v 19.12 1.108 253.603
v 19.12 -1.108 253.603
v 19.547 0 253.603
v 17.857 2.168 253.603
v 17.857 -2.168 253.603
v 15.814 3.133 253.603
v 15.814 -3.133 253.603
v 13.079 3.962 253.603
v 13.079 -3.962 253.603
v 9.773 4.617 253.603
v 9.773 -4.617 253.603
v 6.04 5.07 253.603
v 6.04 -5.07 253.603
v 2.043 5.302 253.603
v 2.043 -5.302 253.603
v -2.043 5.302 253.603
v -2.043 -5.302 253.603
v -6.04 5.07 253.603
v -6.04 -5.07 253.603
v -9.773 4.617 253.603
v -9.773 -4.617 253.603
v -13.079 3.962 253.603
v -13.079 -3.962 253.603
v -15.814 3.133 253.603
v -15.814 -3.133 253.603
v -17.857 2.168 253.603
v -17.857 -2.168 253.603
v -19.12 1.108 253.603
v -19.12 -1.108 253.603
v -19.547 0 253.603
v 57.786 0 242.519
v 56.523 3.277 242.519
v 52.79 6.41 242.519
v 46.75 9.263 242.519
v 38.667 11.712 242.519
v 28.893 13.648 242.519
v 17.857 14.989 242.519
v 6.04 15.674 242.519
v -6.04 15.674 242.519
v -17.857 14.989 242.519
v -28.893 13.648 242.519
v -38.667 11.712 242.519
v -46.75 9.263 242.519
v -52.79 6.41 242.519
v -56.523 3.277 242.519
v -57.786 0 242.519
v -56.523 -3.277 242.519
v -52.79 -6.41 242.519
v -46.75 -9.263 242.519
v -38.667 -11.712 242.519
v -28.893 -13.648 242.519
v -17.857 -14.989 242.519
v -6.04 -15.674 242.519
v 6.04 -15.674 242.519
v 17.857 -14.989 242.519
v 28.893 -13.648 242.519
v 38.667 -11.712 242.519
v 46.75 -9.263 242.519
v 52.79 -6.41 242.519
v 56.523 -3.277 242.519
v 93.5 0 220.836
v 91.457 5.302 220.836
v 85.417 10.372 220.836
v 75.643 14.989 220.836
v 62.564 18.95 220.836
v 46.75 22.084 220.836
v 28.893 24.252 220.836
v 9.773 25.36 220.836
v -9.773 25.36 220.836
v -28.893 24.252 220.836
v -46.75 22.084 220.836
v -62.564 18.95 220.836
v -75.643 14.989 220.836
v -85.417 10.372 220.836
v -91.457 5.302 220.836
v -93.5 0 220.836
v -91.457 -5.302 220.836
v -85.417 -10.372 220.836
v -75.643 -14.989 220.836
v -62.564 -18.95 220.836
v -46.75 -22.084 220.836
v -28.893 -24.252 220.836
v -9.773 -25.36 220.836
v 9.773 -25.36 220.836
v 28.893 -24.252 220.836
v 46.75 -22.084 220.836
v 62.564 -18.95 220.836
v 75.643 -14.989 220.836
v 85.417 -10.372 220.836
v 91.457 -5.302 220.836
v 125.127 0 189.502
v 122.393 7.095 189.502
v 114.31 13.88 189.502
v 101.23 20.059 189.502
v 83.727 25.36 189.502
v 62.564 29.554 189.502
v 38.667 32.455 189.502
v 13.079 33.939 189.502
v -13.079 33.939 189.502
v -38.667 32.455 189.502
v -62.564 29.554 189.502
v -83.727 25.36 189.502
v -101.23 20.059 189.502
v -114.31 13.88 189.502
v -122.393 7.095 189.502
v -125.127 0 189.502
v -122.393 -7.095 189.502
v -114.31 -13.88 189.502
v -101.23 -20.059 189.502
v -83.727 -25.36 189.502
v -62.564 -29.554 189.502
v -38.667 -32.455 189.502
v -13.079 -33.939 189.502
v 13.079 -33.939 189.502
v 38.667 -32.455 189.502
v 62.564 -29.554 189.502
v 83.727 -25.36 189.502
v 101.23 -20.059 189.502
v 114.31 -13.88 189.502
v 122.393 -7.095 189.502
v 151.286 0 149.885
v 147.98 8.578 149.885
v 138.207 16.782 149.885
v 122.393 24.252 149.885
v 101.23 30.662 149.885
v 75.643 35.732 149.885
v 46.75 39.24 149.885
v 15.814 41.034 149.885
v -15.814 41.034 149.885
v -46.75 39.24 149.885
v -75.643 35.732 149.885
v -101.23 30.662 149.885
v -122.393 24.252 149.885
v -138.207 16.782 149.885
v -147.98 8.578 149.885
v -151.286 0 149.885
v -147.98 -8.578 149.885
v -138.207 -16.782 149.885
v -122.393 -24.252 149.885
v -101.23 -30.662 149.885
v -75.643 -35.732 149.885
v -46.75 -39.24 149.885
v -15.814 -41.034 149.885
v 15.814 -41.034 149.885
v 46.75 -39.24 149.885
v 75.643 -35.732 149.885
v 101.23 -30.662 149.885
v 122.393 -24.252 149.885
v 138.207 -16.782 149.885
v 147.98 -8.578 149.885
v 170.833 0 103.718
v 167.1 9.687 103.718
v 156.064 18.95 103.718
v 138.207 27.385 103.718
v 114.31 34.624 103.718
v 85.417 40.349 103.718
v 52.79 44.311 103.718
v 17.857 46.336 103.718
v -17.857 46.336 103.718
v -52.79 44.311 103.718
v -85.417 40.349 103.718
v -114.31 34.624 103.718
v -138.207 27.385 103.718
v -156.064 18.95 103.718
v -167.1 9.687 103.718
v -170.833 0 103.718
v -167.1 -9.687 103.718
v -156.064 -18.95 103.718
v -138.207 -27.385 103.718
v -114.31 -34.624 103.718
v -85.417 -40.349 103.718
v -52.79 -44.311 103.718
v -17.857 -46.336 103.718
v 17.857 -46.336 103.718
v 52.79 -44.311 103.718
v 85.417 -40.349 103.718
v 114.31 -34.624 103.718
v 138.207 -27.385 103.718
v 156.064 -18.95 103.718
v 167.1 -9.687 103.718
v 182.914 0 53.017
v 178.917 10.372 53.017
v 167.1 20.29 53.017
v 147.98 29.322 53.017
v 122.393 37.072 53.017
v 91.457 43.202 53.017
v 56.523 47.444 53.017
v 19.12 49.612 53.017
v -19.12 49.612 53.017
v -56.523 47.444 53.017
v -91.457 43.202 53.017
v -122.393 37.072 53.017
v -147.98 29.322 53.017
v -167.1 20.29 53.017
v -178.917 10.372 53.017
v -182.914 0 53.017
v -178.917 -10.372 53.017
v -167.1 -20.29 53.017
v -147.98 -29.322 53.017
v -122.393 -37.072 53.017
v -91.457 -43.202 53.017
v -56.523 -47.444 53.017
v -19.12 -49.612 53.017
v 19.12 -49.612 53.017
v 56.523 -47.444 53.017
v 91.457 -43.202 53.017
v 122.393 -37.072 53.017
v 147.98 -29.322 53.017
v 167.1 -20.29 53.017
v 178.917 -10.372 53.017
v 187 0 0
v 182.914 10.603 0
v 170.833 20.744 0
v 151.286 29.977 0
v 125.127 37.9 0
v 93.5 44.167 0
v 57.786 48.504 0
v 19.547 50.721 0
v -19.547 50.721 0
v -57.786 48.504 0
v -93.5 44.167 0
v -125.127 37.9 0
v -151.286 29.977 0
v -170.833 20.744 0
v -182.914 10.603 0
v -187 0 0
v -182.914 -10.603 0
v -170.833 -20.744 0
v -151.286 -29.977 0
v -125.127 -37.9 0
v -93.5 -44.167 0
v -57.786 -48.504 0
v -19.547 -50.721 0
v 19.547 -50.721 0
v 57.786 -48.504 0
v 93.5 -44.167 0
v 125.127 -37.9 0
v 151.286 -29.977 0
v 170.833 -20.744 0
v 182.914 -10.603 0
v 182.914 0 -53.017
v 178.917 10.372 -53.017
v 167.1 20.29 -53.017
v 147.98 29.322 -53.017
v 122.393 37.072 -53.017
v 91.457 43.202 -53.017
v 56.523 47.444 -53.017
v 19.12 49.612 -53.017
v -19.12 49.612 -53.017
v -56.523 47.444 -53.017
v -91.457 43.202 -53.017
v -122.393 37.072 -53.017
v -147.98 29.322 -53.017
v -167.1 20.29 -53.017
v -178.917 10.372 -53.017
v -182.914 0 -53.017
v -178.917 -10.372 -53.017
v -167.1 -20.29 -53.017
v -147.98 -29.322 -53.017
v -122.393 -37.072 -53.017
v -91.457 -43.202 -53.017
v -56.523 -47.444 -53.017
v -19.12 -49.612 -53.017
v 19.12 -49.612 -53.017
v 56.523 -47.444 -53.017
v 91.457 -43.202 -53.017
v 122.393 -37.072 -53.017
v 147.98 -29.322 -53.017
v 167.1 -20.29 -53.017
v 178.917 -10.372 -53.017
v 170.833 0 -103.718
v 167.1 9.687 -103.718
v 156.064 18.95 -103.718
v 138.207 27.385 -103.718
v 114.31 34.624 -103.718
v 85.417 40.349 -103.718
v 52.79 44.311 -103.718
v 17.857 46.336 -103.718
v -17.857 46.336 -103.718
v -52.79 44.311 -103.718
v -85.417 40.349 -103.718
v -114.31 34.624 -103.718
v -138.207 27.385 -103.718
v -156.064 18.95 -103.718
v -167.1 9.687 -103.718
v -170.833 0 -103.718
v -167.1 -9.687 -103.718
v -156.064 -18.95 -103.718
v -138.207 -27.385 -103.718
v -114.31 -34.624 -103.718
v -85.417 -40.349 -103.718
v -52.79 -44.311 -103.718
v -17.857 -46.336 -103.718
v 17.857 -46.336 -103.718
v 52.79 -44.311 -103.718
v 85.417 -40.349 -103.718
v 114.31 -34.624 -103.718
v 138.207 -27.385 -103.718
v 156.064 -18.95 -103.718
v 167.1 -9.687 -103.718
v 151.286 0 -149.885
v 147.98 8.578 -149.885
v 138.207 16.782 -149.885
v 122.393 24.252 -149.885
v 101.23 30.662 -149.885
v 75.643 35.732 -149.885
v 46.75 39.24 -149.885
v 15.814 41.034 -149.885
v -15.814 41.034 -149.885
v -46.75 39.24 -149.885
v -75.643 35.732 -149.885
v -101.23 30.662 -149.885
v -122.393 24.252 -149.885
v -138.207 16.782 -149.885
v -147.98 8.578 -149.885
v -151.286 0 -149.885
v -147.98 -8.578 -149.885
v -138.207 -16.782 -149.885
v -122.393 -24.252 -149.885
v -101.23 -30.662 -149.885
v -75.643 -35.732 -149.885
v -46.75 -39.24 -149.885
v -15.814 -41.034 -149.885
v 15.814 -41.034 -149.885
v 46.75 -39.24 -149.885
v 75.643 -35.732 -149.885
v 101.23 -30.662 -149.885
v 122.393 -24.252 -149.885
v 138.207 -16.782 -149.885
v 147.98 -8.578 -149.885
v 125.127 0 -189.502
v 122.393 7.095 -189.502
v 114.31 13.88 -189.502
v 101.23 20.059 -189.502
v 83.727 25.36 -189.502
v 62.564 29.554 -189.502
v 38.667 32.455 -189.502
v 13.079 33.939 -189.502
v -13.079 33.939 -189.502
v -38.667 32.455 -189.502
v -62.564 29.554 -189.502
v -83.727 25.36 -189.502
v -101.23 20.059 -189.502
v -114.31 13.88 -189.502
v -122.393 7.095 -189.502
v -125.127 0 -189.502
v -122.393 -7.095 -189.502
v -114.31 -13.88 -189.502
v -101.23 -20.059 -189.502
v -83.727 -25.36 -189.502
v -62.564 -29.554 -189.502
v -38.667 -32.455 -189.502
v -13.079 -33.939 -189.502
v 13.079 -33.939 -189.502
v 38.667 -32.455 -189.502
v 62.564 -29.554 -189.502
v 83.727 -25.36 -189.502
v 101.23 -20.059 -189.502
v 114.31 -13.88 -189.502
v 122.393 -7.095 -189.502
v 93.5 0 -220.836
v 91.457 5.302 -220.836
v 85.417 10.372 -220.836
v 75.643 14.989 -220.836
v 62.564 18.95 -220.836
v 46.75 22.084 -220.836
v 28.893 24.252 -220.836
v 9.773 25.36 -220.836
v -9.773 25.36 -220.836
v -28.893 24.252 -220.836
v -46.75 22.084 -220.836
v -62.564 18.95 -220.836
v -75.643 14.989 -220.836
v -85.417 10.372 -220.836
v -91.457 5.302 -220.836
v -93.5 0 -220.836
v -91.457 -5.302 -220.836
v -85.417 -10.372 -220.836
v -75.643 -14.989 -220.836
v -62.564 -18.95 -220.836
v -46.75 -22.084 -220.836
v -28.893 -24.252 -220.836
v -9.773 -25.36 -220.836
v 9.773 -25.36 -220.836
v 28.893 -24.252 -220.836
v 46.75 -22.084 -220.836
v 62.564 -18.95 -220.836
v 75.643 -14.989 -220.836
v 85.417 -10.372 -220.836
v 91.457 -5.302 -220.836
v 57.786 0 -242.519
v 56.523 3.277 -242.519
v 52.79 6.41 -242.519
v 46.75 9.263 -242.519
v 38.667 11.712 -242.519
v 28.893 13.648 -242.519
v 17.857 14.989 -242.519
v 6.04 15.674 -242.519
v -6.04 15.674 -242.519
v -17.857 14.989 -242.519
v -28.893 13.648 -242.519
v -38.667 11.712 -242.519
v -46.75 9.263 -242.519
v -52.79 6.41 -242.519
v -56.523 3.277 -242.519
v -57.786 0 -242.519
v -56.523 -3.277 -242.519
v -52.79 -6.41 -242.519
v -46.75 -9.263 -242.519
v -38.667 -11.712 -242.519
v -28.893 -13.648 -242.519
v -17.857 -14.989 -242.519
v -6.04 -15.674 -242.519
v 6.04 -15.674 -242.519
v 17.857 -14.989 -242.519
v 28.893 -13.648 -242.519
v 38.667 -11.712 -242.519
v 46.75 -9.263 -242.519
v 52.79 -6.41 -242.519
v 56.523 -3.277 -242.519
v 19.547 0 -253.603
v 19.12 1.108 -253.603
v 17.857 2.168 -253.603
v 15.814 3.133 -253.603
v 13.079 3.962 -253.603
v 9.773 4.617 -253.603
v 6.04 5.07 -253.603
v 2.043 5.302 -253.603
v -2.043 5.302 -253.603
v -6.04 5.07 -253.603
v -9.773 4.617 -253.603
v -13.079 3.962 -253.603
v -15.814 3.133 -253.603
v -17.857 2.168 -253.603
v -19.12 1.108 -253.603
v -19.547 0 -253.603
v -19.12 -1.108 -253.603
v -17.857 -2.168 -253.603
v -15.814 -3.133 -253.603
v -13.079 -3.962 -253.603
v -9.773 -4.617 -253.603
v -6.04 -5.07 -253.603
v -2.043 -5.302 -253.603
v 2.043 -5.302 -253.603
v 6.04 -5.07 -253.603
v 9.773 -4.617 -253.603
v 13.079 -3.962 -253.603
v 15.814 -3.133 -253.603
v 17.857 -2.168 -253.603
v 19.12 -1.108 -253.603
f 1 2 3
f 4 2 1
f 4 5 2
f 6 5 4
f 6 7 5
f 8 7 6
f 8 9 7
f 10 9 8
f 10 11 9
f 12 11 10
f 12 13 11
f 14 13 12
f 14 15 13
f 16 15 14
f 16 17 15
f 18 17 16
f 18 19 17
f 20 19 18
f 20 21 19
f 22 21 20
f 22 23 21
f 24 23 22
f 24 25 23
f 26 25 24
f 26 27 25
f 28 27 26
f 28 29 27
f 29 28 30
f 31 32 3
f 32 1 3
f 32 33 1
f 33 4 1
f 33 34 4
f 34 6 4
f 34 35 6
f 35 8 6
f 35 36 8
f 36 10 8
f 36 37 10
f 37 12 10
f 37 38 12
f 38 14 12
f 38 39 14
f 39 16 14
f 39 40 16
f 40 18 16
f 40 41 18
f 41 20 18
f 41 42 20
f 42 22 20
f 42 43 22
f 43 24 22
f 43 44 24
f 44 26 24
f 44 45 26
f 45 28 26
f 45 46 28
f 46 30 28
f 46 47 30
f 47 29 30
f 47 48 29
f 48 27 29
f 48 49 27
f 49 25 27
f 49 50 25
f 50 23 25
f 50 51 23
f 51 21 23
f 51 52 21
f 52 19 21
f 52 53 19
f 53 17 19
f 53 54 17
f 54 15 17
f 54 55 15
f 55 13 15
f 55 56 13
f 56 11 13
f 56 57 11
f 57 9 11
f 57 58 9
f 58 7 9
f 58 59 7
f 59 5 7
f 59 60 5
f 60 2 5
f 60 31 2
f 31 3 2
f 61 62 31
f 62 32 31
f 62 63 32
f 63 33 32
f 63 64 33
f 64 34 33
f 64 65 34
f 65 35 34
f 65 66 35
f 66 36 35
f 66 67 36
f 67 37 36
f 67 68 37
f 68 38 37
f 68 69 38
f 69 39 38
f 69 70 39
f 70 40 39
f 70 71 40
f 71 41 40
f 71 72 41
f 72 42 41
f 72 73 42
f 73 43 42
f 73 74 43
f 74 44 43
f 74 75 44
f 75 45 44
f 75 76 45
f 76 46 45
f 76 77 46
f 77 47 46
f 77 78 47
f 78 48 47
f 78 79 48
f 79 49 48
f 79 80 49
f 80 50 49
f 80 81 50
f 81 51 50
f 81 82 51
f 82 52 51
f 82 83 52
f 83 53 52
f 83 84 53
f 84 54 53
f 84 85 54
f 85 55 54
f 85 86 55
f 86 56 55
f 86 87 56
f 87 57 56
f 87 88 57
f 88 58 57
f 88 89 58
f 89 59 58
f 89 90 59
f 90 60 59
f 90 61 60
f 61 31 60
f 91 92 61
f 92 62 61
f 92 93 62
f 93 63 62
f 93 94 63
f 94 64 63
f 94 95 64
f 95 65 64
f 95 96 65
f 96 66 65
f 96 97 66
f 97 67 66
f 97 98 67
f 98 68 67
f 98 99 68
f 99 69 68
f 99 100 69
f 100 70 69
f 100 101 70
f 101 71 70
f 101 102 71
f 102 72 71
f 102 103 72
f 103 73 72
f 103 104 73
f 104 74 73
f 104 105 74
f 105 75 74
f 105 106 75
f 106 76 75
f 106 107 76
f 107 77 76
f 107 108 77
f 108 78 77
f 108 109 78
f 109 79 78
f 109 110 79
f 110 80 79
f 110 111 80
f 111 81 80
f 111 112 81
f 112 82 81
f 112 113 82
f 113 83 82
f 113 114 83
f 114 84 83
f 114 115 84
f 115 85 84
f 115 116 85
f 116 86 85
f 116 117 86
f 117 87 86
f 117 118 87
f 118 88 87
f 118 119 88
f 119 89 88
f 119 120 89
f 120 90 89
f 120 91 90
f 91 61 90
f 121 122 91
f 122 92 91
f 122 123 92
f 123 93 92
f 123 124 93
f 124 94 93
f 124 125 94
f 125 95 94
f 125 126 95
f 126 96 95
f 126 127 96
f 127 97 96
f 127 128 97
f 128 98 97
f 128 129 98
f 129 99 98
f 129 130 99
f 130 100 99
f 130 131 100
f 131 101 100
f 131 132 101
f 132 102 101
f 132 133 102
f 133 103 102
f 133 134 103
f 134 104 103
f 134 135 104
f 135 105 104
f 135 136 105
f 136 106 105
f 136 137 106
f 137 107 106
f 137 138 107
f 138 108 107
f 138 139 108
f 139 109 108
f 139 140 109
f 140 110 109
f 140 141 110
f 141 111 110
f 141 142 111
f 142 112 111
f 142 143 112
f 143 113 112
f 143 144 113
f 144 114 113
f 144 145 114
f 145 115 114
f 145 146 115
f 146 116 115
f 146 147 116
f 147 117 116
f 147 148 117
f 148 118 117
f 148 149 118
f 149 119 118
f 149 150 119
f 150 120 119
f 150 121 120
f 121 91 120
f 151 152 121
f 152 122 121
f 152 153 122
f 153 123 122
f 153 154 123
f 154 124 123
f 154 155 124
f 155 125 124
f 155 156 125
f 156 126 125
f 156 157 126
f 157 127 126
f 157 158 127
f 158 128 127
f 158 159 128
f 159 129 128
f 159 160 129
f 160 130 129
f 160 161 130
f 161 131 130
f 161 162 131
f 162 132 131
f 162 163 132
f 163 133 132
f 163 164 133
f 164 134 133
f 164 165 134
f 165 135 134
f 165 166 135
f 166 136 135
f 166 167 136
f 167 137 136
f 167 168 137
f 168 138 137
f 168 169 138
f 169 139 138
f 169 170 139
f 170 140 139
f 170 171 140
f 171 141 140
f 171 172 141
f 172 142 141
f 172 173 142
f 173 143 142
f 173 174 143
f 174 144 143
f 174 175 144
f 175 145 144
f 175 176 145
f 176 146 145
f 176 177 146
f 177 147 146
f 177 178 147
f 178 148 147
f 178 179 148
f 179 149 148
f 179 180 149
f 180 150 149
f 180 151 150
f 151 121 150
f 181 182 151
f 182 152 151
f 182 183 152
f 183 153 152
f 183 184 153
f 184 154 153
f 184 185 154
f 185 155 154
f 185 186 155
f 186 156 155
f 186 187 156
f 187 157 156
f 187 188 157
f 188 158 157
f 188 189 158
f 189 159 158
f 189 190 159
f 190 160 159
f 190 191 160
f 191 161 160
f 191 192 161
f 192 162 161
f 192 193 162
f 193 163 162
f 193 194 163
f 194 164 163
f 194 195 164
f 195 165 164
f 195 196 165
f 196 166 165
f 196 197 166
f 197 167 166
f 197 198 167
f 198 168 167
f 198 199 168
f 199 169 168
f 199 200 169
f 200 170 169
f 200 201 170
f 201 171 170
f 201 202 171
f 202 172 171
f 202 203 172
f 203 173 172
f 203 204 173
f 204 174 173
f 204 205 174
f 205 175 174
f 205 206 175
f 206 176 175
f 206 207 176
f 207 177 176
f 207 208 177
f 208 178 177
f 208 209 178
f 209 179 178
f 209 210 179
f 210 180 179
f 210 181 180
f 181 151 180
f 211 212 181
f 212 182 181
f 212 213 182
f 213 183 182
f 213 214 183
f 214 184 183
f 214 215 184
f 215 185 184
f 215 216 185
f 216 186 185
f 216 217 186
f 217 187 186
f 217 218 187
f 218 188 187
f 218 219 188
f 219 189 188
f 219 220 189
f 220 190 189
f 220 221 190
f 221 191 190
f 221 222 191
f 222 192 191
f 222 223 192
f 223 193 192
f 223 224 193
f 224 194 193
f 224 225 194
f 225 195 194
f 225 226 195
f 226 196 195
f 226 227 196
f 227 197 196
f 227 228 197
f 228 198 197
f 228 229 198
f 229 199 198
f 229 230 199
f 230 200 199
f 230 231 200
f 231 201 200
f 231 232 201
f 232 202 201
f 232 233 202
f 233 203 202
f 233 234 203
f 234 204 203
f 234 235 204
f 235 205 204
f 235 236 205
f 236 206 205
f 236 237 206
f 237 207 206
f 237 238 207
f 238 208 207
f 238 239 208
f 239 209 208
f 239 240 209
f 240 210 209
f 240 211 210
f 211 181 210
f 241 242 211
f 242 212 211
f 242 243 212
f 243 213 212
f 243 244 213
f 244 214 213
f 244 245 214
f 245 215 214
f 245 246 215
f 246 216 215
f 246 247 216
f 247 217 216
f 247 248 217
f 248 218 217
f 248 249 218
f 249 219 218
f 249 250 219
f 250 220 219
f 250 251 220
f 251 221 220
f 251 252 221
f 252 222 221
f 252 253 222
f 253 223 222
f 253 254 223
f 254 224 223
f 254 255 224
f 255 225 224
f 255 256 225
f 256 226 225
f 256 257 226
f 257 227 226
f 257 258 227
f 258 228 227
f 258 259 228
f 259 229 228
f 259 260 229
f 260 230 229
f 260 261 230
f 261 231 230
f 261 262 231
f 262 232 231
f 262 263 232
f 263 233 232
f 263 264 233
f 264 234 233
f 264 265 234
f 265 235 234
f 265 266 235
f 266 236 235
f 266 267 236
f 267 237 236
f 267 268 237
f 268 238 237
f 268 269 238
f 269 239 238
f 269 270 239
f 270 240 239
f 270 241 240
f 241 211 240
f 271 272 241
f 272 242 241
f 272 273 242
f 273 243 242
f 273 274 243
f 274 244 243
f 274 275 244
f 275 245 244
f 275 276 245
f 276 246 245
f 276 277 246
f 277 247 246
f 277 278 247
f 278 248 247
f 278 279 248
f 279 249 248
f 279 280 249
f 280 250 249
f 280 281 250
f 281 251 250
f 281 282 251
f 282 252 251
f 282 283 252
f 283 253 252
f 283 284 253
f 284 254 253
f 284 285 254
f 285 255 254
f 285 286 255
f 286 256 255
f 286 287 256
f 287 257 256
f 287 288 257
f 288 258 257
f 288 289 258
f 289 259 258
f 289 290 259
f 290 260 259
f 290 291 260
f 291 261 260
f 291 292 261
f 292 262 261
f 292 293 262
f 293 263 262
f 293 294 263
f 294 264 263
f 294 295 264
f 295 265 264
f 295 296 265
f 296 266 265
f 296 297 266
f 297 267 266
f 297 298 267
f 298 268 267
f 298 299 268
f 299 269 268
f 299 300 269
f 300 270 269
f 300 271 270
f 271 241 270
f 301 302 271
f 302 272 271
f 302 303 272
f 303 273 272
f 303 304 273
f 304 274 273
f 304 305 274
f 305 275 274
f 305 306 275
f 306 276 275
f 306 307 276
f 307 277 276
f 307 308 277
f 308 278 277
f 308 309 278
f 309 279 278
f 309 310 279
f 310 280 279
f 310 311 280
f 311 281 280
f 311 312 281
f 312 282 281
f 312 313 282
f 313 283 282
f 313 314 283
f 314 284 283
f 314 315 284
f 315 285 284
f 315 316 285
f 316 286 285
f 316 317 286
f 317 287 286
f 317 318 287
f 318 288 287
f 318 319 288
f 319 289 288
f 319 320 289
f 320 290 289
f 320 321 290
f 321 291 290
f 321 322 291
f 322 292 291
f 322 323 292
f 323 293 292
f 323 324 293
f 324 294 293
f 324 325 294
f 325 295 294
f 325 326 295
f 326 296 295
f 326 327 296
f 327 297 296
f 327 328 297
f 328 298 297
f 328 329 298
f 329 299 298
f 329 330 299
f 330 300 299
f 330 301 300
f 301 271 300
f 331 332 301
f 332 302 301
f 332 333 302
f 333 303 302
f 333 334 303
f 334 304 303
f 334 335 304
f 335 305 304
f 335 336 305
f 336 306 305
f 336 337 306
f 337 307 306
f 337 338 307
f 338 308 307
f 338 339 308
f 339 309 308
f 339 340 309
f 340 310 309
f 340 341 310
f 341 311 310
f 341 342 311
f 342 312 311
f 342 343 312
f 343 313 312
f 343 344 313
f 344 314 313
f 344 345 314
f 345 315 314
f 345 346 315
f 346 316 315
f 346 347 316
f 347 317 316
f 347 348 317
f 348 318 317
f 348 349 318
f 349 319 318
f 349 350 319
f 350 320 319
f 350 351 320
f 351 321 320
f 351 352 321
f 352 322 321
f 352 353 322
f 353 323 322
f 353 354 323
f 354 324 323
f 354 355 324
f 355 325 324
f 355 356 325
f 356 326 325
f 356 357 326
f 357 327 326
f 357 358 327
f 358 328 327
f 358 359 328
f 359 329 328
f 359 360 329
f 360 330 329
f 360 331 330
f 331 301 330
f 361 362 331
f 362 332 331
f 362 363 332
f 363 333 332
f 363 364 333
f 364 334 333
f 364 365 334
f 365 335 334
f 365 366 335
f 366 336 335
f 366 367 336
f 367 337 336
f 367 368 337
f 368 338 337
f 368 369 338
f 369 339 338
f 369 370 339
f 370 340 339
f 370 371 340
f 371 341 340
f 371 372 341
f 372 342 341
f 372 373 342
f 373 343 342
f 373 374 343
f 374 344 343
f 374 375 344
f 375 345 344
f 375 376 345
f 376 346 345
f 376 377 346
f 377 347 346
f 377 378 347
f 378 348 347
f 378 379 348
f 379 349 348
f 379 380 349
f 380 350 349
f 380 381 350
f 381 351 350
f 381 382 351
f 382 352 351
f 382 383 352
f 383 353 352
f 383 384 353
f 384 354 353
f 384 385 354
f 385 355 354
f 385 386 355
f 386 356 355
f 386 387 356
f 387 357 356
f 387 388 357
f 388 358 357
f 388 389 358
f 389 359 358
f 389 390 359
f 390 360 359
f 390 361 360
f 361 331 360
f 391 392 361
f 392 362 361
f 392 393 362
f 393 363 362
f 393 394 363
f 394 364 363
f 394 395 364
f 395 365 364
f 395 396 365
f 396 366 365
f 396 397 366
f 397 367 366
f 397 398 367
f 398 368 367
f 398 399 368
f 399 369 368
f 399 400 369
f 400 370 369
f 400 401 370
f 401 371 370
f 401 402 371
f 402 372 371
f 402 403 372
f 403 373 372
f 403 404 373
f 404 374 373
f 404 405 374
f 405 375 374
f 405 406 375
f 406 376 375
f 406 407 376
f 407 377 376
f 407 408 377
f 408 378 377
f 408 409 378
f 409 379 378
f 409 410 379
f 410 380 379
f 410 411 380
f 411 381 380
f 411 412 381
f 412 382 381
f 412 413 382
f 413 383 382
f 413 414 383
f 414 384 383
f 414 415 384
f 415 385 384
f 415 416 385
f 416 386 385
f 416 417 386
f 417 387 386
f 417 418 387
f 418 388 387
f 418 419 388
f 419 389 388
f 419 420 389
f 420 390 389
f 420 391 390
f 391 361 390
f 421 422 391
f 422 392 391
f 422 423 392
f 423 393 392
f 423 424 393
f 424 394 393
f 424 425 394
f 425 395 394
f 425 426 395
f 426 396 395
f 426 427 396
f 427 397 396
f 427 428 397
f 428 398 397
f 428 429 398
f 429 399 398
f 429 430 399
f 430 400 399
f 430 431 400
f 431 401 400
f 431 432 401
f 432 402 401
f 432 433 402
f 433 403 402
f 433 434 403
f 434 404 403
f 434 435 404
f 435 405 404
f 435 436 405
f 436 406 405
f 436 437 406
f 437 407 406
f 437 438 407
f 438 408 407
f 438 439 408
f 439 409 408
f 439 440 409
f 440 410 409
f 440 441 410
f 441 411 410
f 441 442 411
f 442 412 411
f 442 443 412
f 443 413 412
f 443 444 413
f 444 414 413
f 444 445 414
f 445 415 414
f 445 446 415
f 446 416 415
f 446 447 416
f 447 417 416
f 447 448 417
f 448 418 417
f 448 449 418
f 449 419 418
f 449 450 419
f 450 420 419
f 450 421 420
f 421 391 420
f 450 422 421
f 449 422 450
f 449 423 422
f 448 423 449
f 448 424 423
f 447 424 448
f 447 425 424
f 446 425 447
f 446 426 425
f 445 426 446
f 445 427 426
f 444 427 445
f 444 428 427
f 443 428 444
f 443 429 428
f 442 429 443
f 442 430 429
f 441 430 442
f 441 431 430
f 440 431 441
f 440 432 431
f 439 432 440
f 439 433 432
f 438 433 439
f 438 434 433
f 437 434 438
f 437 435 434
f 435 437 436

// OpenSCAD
// Generated by SolidPython 1.0.1 on 2020-07-29 00:46:49


scale(v = [11, 3, 15]) {
	sphere(r = 17);
}
/***********************************************
*********      SolidPython code:      **********
************************************************
 
# import packages: SolidPython
from solid import *
from solid.utils import *
from itertools import chain, combinations, permutations


class Resize:

    def __init__(self, scad_file):
        self.scad_file = scad_file
        #self.scad_file = import_scad(scad_file)
        # cone/cylinder param:
        self.r1 = 0
        self.r2 = 0
        self.h = 0
        # rectangular prism param:
        self.w = 0
        self.l = 0
        # ellipse param:
        self.r = 0

    # import OpenScad code (file name corresponds to shape)


    # classify shape + parameters
    def assign(self, param1, param2, param3):
        if self.scad_file == 'cone.scad':
            self.r1 = param1
            self.r2 = param2
            self.h = param3
        elif self.scad_file == 'cylinder.scad':
            self.r1 = param1
            self.r2 = param2
            self.h = param3
        elif self.scad_file == 'rectangularPrism.scad':
            self.h = param1
            self.l = param2
            self.w = param3
        else:
            self.r = param1
            self.h = param2

    # resize parameters
    def iterate(self):
        x = range(3, 20, 2)
        i = 1
        if self.scad_file == 'cone.scad':
            tempList = list(permutations(x, 2))
            for temp in tempList:
                param1 = temp[0]
                param2 = temp[1]
                filepath = 'produced_scad_files/' + 'cone' + str(param1) + '_' + str(param2) + '_' + '.scad'
                scad_render_to_file(cylinder(h=param1, r1=param2, r2=0), filepath)

        elif self.scad_file == 'cylinder.scad':
            tempList = list(permutations(x, 3))
            for temp in tempList:
                param1 = temp[0]
                param2 = temp[1]
                filepath = 'produced_scad_files/' + 'cylinder' + str(param1) + '_' + str(param2) + '_' + '.scad'
                scad_render_to_file(cylinder(h=param1, r1=param2, r2=param2), filepath)

        elif self.scad_file == 'rectangularPrism.scad':
            tempList = list(permutations(x, 3))
            for temp in tempList:
                param1 = temp[0]
                param2 = temp[1]
                param3 = temp[2]
                filepath = 'produced_scad_files/' + 'rectangularPrism' + str(param1) + '_' + str(param2) + '_' + str(
                    param3) + '.scad'
                scad_render_to_file(cube(size=(param1, param2, param3)), filepath)

        elif self.scad_file == 'ellipse.scad':
            tempList = list(permutations(x, 4))
            for temp in tempList:
                param1 = temp[0]
                param2 = temp[1]
                param3 = temp[2]
                param4 = temp[3]
                filepath = 'produced_scad_files/' + 'ellipse' + str(param1) + '_' + str(param2) + '_' + str(param3) + '_' + str(param4) + '.scad'
                scad_render_to_file(scale([param1, param2, param3])(sphere(r=param4)), filepath)

    def render_to_scadfile(self):
        scad_render_to_file(scad, 'example.scad') 
 
************************************************/
